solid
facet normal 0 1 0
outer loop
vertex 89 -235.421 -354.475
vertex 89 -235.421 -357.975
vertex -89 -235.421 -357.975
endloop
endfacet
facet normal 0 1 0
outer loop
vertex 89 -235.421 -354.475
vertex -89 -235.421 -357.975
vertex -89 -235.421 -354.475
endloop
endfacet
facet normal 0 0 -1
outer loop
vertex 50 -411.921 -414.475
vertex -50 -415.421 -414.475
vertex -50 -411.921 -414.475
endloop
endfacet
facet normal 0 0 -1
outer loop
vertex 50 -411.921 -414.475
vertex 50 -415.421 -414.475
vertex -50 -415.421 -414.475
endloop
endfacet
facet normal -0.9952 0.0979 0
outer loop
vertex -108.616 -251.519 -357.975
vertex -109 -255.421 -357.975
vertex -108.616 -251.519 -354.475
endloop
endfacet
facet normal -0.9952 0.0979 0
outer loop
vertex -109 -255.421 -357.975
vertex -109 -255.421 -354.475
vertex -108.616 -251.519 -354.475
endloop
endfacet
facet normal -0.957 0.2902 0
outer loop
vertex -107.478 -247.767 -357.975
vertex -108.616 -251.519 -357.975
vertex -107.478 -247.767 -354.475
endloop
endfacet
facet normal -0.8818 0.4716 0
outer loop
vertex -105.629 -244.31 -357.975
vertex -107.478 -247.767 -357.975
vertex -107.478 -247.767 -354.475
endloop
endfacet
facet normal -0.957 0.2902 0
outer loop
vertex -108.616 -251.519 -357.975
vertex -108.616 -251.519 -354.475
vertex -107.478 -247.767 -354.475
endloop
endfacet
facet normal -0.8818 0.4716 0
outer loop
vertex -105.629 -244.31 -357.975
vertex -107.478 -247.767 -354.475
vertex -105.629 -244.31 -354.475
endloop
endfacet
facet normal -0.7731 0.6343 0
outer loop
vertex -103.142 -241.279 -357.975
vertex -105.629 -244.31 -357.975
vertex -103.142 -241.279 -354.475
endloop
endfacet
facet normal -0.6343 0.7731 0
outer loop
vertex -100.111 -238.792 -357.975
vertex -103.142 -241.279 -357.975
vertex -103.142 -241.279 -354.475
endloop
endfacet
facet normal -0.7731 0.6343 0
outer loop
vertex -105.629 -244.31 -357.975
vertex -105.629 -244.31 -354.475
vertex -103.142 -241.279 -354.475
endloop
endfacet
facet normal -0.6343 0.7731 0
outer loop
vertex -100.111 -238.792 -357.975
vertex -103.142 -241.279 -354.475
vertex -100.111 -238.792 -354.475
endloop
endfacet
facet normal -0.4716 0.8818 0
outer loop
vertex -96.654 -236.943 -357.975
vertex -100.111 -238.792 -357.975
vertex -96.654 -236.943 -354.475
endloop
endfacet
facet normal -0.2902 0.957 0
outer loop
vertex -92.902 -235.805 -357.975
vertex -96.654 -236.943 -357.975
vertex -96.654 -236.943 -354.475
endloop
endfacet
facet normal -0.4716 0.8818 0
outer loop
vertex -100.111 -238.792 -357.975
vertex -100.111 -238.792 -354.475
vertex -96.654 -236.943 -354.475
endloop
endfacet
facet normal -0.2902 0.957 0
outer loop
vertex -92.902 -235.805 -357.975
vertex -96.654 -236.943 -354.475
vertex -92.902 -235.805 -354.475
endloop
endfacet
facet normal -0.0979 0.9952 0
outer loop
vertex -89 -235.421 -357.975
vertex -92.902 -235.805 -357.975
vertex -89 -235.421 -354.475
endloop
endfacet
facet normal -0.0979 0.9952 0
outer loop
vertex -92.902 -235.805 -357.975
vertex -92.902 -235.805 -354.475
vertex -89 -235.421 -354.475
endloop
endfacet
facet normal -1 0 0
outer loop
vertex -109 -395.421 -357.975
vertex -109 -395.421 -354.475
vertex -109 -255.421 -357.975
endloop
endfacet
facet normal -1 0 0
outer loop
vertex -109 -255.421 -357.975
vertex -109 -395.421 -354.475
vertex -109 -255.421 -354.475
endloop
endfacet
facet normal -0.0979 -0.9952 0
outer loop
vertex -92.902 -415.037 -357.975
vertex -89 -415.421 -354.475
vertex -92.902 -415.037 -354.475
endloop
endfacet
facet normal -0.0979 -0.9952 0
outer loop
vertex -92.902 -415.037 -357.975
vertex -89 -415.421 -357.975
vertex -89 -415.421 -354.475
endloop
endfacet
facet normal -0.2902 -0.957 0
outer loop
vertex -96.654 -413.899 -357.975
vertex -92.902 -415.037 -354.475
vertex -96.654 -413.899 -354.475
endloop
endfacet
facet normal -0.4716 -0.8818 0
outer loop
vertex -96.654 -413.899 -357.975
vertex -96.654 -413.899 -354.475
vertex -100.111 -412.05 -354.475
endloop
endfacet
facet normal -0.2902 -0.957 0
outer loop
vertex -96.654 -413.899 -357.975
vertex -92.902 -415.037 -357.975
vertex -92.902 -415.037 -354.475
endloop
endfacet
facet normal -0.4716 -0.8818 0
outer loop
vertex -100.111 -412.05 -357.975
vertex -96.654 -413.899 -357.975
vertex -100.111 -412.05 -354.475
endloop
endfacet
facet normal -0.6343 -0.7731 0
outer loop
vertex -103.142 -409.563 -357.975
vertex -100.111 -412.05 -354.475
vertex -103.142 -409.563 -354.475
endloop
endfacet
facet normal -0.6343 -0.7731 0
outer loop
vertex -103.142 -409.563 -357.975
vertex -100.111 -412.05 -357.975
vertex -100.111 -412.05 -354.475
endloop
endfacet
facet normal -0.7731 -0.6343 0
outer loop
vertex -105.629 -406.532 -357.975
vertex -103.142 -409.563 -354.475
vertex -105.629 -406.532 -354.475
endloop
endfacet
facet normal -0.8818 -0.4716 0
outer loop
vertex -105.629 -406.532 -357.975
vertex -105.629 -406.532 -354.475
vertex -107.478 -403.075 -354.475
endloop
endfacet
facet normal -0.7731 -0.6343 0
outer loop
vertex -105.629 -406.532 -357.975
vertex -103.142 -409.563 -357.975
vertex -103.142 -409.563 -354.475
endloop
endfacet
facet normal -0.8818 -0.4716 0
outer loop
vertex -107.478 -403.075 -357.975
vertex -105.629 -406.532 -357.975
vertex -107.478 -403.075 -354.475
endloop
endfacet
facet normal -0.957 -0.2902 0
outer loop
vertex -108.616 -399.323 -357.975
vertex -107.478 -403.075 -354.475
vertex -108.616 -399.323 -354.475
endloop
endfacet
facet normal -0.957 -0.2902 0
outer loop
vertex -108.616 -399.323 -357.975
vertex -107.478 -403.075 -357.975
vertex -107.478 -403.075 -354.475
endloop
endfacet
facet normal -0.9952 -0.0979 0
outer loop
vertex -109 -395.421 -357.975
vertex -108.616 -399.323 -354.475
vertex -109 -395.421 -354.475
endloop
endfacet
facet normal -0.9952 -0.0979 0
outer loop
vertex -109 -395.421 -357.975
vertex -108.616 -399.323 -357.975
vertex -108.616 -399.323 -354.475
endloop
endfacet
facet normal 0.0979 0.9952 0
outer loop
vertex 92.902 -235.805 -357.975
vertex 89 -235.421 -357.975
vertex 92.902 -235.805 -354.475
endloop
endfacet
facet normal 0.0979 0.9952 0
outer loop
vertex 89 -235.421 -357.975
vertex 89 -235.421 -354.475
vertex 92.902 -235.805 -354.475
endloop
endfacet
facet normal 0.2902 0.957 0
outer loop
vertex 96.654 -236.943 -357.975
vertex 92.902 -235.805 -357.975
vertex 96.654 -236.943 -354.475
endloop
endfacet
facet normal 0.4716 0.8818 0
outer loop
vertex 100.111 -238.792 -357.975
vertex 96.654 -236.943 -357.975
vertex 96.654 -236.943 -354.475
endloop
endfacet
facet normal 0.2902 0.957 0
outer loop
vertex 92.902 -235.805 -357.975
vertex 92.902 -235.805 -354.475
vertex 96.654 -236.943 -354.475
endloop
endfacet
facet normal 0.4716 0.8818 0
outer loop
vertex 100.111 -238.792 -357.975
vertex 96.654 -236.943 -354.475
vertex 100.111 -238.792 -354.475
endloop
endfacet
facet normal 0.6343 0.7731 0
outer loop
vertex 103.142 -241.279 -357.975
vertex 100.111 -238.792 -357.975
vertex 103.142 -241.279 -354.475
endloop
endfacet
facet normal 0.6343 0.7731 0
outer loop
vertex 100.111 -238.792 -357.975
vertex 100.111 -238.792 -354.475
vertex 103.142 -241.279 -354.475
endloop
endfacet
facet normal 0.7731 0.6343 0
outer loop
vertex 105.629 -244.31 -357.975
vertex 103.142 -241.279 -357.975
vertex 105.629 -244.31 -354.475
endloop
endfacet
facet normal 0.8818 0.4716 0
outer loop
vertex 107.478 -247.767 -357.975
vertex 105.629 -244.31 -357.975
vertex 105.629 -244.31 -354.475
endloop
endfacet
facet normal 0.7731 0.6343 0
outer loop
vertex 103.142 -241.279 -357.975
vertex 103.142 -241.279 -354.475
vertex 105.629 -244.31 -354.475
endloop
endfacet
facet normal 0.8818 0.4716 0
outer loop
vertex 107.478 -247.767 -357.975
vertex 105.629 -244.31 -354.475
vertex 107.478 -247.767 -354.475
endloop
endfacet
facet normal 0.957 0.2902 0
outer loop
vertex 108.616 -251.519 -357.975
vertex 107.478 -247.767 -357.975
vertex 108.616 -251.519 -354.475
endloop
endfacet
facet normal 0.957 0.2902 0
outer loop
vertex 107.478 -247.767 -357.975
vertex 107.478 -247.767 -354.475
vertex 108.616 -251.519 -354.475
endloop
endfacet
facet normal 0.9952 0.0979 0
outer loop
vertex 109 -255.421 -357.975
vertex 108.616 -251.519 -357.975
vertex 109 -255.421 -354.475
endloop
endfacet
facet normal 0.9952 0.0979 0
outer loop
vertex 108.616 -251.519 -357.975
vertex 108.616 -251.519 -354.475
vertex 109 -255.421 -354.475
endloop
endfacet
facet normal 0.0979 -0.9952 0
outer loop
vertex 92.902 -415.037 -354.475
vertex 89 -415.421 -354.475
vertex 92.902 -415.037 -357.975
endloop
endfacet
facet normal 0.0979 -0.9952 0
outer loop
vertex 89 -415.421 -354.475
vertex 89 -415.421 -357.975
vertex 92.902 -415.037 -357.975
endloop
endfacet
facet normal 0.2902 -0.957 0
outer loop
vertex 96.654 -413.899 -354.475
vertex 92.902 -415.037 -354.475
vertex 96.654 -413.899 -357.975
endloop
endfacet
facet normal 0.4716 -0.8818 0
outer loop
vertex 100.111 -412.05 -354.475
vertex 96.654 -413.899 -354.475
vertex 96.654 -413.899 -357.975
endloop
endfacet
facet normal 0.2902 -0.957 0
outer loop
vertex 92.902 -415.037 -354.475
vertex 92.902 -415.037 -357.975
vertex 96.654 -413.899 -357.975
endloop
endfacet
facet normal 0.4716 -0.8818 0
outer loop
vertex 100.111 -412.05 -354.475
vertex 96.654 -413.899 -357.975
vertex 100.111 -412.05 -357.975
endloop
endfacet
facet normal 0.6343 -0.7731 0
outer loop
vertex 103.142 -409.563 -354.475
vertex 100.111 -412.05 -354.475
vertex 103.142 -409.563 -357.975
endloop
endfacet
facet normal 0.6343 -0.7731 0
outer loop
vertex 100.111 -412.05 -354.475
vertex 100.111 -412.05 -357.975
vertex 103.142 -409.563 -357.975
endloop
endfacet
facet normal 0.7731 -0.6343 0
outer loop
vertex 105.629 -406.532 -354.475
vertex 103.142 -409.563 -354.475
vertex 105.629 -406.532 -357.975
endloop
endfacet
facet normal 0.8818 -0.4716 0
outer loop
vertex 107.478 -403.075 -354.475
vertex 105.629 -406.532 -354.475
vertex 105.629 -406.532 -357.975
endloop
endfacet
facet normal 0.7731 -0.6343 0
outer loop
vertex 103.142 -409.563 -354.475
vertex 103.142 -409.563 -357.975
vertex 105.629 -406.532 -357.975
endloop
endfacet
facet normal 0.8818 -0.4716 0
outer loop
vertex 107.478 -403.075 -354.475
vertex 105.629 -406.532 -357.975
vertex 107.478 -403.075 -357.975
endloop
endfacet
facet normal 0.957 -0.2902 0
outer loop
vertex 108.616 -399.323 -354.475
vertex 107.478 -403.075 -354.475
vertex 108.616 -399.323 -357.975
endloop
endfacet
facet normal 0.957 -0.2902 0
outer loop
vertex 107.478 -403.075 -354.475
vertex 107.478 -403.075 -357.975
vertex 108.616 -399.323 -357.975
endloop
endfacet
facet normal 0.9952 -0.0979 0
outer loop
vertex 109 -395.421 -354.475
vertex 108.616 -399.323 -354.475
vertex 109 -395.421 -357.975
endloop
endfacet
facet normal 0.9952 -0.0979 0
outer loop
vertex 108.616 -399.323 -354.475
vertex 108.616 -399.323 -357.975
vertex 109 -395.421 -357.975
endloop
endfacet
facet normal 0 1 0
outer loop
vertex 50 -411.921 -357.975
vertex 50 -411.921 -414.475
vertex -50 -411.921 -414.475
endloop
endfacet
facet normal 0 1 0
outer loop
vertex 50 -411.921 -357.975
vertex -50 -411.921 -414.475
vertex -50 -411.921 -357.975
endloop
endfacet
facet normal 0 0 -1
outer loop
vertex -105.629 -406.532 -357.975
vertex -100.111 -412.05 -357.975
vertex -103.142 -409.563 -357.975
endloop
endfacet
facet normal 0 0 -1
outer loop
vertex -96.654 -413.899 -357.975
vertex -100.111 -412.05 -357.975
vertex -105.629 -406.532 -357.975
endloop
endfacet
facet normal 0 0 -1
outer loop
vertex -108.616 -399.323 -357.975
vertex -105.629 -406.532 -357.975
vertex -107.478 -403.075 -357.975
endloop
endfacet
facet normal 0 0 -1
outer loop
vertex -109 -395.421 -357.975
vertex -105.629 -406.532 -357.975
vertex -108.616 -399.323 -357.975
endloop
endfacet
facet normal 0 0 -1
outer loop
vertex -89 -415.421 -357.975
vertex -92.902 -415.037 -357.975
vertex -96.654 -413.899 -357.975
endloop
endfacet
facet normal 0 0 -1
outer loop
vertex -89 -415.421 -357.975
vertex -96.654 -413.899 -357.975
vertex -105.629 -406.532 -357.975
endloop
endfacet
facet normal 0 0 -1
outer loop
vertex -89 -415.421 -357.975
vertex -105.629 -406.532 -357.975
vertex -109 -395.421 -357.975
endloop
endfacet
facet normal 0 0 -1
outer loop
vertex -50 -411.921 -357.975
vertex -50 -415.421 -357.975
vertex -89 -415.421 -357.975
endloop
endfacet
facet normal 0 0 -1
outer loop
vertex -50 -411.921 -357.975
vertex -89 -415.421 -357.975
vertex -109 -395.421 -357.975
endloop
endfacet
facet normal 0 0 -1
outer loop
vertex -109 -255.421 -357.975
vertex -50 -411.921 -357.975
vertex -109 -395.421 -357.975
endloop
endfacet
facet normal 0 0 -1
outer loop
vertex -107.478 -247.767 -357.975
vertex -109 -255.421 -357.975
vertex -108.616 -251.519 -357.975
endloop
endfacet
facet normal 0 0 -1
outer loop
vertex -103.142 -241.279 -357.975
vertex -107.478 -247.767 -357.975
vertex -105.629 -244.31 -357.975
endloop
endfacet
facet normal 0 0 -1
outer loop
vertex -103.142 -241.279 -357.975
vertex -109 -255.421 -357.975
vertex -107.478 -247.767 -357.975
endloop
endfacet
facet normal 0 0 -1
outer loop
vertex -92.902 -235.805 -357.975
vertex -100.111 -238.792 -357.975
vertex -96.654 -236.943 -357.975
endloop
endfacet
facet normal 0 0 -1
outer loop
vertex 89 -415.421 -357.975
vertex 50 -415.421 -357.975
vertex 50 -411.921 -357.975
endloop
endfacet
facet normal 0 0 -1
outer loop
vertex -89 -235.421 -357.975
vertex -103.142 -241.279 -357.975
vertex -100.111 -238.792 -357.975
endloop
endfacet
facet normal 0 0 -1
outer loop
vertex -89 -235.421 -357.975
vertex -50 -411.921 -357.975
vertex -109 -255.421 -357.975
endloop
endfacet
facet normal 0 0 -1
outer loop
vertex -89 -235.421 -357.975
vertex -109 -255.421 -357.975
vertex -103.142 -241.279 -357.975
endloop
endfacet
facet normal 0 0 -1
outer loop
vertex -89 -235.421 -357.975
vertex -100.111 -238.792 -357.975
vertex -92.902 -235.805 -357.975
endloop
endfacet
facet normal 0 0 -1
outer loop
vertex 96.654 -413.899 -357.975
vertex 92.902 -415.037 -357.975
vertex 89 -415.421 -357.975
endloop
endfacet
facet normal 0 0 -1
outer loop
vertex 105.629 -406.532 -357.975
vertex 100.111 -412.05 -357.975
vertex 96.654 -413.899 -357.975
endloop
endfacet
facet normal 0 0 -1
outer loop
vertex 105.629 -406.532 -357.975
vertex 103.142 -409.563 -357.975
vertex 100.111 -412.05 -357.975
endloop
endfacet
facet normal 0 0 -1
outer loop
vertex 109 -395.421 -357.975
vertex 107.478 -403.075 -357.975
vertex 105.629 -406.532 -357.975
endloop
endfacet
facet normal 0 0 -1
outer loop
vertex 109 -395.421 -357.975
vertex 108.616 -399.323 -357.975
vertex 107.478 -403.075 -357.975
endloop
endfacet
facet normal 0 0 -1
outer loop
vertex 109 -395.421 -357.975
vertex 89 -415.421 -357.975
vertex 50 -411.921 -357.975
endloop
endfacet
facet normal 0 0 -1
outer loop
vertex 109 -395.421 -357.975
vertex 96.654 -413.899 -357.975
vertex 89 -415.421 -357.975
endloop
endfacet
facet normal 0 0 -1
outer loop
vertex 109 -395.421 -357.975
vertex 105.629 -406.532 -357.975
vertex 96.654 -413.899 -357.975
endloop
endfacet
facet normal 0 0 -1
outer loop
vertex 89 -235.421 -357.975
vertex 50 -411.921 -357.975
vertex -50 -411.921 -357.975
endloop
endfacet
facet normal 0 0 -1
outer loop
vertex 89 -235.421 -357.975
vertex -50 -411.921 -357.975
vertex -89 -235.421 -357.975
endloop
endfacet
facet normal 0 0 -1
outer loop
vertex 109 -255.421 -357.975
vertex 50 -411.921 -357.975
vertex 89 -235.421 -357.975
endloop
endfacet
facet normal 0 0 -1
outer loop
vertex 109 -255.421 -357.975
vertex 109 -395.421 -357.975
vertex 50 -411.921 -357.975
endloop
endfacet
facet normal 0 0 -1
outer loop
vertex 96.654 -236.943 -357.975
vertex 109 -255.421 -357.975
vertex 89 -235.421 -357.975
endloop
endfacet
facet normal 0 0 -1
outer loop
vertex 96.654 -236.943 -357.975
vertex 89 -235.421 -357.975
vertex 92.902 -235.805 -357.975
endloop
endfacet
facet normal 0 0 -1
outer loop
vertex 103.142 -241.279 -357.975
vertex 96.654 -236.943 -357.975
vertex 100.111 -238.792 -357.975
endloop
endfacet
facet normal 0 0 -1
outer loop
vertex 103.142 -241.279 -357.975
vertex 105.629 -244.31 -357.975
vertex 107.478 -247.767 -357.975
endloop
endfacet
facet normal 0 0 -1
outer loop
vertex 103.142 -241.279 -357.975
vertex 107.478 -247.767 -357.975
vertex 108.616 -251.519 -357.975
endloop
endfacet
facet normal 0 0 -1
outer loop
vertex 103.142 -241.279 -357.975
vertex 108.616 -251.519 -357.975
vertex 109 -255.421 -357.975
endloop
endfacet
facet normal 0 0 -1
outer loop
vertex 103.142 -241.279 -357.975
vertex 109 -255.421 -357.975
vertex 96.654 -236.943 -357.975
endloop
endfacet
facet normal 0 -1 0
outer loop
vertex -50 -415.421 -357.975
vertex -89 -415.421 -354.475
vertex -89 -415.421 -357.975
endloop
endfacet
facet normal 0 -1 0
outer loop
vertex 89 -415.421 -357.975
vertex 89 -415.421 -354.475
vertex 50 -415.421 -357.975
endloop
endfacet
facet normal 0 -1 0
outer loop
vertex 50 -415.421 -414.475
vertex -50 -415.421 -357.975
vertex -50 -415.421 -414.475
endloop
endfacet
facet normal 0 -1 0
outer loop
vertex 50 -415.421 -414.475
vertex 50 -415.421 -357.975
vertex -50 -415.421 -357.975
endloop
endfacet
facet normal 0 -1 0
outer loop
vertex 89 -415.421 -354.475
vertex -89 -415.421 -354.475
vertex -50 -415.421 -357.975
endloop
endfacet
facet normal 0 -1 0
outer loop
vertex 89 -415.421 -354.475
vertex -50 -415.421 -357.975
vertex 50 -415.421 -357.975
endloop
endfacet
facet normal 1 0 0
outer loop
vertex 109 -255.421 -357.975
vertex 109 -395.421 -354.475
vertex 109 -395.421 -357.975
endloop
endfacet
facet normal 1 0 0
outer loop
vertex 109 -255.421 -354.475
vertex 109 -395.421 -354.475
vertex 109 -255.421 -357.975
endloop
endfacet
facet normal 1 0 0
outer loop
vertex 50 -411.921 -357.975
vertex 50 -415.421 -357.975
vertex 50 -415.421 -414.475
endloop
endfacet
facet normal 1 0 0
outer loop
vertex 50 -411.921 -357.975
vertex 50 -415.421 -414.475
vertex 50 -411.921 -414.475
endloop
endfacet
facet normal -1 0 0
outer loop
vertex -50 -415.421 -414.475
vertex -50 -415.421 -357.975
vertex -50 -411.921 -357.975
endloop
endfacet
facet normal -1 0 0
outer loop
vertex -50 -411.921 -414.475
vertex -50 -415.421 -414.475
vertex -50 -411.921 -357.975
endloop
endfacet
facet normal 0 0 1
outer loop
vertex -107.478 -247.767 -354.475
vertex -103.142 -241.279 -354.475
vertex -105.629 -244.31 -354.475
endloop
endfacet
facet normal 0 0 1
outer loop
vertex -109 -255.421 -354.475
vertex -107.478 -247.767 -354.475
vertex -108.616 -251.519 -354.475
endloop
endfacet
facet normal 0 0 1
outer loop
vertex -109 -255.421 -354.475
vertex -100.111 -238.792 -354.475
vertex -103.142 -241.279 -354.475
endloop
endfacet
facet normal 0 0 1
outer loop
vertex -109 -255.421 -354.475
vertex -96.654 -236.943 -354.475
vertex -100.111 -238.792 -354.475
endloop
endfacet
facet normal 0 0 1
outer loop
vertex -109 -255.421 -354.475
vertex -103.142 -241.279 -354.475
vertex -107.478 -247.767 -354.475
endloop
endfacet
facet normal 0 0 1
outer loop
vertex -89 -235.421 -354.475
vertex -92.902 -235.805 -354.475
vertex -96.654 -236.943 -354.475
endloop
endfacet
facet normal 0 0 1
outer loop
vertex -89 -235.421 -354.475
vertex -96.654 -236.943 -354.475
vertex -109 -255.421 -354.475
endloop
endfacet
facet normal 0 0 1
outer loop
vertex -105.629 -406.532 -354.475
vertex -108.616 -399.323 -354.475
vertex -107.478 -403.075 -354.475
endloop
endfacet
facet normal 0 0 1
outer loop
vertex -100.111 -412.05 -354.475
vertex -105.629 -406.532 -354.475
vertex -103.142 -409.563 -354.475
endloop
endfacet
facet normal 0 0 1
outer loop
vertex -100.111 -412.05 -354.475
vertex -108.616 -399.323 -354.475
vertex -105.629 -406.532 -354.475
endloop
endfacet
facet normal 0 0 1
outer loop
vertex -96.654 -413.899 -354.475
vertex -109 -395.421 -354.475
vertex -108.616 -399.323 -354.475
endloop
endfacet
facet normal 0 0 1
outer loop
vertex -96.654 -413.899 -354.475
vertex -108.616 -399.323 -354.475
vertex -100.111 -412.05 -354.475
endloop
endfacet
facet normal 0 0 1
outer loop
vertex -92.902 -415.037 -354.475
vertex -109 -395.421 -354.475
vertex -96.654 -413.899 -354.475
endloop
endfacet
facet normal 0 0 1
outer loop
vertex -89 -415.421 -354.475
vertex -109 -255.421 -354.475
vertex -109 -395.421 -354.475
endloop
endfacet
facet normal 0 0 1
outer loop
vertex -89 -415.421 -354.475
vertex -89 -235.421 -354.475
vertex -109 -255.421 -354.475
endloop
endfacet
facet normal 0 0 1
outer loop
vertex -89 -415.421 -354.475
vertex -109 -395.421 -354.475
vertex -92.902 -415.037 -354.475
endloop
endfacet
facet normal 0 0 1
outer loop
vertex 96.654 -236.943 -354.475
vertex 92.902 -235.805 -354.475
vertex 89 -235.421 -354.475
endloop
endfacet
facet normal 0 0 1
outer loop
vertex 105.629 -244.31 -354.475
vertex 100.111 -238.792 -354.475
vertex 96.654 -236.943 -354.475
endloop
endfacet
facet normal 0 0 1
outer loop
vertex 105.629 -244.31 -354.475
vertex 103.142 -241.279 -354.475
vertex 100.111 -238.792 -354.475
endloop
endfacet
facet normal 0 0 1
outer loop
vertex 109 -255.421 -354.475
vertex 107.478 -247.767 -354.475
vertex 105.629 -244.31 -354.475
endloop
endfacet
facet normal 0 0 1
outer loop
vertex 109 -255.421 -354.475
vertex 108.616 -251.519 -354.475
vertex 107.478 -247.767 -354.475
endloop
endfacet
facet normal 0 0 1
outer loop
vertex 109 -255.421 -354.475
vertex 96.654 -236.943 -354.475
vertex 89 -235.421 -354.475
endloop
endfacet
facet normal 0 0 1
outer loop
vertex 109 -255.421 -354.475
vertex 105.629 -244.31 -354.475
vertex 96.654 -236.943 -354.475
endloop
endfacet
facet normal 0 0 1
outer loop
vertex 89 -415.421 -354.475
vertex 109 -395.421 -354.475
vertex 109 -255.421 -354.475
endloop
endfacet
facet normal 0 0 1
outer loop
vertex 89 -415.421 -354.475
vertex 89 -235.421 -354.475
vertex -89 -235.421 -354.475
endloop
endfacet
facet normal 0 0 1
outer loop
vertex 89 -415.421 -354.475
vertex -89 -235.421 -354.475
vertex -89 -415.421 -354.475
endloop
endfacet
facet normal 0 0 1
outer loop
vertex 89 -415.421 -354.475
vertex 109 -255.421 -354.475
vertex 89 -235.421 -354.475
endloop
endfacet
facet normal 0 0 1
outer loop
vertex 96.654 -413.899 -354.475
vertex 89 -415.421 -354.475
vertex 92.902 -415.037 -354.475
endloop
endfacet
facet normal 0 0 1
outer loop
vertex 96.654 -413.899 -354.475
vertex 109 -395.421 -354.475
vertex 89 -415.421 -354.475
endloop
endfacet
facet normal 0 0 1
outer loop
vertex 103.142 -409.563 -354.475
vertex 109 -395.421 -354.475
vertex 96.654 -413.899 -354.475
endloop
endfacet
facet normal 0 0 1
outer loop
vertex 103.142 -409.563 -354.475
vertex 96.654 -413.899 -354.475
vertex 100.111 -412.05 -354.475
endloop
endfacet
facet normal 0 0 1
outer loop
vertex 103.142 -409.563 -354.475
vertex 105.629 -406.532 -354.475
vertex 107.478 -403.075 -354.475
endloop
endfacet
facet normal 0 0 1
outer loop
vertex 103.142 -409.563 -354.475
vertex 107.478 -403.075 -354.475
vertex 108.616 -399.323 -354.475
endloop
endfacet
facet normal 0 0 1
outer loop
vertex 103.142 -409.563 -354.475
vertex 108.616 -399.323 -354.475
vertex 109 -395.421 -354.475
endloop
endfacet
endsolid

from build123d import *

# Parameters (mm, degrees)
F1_DEPTH = 109
F0_W     = 3.5
F0_H     = 56.5
F2_DEPTH = 50
F3_R     = 20


with BuildPart() as f1:
    # F0 (on Right) → F1 (new body, symmetric)
    with BuildSketch(Plane.YZ):
        Polygon((-415.420956, -354.475219), (-415.420956, -357.975219), (-411.920956, -357.975219), (-235.420956, -357.975219), (-235.420956, -354.475219), align=None)
    extrude(amount=F1_DEPTH, both=True)

    # F0 (on Right) → F2 (join, symmetric)
    with BuildSketch(Plane.YZ):
        with Locations((-413.670956, -386.225219)):
            Rectangle(F0_W, F0_H)
        Polygon((-415.420956, -354.475219), (-415.420956, -357.975219), (-411.920956, -357.975219), (-235.420956, -357.975219), (-235.420956, -354.475219), align=None)
    extrude(amount=F2_DEPTH, both=True)

    # F3
    f3_edges = [f1.edges().sort_by_distance(p)[0] for p in [
        (109, -235.420956, -356.225219),
        (-109, -235.420956, -356.225219),
        (-109, -415.420956, -356.225219),
        (109, -415.420956, -356.225219),
    ]]
    fillet(f3_edges, radius=F3_R)


solid = f1.part
